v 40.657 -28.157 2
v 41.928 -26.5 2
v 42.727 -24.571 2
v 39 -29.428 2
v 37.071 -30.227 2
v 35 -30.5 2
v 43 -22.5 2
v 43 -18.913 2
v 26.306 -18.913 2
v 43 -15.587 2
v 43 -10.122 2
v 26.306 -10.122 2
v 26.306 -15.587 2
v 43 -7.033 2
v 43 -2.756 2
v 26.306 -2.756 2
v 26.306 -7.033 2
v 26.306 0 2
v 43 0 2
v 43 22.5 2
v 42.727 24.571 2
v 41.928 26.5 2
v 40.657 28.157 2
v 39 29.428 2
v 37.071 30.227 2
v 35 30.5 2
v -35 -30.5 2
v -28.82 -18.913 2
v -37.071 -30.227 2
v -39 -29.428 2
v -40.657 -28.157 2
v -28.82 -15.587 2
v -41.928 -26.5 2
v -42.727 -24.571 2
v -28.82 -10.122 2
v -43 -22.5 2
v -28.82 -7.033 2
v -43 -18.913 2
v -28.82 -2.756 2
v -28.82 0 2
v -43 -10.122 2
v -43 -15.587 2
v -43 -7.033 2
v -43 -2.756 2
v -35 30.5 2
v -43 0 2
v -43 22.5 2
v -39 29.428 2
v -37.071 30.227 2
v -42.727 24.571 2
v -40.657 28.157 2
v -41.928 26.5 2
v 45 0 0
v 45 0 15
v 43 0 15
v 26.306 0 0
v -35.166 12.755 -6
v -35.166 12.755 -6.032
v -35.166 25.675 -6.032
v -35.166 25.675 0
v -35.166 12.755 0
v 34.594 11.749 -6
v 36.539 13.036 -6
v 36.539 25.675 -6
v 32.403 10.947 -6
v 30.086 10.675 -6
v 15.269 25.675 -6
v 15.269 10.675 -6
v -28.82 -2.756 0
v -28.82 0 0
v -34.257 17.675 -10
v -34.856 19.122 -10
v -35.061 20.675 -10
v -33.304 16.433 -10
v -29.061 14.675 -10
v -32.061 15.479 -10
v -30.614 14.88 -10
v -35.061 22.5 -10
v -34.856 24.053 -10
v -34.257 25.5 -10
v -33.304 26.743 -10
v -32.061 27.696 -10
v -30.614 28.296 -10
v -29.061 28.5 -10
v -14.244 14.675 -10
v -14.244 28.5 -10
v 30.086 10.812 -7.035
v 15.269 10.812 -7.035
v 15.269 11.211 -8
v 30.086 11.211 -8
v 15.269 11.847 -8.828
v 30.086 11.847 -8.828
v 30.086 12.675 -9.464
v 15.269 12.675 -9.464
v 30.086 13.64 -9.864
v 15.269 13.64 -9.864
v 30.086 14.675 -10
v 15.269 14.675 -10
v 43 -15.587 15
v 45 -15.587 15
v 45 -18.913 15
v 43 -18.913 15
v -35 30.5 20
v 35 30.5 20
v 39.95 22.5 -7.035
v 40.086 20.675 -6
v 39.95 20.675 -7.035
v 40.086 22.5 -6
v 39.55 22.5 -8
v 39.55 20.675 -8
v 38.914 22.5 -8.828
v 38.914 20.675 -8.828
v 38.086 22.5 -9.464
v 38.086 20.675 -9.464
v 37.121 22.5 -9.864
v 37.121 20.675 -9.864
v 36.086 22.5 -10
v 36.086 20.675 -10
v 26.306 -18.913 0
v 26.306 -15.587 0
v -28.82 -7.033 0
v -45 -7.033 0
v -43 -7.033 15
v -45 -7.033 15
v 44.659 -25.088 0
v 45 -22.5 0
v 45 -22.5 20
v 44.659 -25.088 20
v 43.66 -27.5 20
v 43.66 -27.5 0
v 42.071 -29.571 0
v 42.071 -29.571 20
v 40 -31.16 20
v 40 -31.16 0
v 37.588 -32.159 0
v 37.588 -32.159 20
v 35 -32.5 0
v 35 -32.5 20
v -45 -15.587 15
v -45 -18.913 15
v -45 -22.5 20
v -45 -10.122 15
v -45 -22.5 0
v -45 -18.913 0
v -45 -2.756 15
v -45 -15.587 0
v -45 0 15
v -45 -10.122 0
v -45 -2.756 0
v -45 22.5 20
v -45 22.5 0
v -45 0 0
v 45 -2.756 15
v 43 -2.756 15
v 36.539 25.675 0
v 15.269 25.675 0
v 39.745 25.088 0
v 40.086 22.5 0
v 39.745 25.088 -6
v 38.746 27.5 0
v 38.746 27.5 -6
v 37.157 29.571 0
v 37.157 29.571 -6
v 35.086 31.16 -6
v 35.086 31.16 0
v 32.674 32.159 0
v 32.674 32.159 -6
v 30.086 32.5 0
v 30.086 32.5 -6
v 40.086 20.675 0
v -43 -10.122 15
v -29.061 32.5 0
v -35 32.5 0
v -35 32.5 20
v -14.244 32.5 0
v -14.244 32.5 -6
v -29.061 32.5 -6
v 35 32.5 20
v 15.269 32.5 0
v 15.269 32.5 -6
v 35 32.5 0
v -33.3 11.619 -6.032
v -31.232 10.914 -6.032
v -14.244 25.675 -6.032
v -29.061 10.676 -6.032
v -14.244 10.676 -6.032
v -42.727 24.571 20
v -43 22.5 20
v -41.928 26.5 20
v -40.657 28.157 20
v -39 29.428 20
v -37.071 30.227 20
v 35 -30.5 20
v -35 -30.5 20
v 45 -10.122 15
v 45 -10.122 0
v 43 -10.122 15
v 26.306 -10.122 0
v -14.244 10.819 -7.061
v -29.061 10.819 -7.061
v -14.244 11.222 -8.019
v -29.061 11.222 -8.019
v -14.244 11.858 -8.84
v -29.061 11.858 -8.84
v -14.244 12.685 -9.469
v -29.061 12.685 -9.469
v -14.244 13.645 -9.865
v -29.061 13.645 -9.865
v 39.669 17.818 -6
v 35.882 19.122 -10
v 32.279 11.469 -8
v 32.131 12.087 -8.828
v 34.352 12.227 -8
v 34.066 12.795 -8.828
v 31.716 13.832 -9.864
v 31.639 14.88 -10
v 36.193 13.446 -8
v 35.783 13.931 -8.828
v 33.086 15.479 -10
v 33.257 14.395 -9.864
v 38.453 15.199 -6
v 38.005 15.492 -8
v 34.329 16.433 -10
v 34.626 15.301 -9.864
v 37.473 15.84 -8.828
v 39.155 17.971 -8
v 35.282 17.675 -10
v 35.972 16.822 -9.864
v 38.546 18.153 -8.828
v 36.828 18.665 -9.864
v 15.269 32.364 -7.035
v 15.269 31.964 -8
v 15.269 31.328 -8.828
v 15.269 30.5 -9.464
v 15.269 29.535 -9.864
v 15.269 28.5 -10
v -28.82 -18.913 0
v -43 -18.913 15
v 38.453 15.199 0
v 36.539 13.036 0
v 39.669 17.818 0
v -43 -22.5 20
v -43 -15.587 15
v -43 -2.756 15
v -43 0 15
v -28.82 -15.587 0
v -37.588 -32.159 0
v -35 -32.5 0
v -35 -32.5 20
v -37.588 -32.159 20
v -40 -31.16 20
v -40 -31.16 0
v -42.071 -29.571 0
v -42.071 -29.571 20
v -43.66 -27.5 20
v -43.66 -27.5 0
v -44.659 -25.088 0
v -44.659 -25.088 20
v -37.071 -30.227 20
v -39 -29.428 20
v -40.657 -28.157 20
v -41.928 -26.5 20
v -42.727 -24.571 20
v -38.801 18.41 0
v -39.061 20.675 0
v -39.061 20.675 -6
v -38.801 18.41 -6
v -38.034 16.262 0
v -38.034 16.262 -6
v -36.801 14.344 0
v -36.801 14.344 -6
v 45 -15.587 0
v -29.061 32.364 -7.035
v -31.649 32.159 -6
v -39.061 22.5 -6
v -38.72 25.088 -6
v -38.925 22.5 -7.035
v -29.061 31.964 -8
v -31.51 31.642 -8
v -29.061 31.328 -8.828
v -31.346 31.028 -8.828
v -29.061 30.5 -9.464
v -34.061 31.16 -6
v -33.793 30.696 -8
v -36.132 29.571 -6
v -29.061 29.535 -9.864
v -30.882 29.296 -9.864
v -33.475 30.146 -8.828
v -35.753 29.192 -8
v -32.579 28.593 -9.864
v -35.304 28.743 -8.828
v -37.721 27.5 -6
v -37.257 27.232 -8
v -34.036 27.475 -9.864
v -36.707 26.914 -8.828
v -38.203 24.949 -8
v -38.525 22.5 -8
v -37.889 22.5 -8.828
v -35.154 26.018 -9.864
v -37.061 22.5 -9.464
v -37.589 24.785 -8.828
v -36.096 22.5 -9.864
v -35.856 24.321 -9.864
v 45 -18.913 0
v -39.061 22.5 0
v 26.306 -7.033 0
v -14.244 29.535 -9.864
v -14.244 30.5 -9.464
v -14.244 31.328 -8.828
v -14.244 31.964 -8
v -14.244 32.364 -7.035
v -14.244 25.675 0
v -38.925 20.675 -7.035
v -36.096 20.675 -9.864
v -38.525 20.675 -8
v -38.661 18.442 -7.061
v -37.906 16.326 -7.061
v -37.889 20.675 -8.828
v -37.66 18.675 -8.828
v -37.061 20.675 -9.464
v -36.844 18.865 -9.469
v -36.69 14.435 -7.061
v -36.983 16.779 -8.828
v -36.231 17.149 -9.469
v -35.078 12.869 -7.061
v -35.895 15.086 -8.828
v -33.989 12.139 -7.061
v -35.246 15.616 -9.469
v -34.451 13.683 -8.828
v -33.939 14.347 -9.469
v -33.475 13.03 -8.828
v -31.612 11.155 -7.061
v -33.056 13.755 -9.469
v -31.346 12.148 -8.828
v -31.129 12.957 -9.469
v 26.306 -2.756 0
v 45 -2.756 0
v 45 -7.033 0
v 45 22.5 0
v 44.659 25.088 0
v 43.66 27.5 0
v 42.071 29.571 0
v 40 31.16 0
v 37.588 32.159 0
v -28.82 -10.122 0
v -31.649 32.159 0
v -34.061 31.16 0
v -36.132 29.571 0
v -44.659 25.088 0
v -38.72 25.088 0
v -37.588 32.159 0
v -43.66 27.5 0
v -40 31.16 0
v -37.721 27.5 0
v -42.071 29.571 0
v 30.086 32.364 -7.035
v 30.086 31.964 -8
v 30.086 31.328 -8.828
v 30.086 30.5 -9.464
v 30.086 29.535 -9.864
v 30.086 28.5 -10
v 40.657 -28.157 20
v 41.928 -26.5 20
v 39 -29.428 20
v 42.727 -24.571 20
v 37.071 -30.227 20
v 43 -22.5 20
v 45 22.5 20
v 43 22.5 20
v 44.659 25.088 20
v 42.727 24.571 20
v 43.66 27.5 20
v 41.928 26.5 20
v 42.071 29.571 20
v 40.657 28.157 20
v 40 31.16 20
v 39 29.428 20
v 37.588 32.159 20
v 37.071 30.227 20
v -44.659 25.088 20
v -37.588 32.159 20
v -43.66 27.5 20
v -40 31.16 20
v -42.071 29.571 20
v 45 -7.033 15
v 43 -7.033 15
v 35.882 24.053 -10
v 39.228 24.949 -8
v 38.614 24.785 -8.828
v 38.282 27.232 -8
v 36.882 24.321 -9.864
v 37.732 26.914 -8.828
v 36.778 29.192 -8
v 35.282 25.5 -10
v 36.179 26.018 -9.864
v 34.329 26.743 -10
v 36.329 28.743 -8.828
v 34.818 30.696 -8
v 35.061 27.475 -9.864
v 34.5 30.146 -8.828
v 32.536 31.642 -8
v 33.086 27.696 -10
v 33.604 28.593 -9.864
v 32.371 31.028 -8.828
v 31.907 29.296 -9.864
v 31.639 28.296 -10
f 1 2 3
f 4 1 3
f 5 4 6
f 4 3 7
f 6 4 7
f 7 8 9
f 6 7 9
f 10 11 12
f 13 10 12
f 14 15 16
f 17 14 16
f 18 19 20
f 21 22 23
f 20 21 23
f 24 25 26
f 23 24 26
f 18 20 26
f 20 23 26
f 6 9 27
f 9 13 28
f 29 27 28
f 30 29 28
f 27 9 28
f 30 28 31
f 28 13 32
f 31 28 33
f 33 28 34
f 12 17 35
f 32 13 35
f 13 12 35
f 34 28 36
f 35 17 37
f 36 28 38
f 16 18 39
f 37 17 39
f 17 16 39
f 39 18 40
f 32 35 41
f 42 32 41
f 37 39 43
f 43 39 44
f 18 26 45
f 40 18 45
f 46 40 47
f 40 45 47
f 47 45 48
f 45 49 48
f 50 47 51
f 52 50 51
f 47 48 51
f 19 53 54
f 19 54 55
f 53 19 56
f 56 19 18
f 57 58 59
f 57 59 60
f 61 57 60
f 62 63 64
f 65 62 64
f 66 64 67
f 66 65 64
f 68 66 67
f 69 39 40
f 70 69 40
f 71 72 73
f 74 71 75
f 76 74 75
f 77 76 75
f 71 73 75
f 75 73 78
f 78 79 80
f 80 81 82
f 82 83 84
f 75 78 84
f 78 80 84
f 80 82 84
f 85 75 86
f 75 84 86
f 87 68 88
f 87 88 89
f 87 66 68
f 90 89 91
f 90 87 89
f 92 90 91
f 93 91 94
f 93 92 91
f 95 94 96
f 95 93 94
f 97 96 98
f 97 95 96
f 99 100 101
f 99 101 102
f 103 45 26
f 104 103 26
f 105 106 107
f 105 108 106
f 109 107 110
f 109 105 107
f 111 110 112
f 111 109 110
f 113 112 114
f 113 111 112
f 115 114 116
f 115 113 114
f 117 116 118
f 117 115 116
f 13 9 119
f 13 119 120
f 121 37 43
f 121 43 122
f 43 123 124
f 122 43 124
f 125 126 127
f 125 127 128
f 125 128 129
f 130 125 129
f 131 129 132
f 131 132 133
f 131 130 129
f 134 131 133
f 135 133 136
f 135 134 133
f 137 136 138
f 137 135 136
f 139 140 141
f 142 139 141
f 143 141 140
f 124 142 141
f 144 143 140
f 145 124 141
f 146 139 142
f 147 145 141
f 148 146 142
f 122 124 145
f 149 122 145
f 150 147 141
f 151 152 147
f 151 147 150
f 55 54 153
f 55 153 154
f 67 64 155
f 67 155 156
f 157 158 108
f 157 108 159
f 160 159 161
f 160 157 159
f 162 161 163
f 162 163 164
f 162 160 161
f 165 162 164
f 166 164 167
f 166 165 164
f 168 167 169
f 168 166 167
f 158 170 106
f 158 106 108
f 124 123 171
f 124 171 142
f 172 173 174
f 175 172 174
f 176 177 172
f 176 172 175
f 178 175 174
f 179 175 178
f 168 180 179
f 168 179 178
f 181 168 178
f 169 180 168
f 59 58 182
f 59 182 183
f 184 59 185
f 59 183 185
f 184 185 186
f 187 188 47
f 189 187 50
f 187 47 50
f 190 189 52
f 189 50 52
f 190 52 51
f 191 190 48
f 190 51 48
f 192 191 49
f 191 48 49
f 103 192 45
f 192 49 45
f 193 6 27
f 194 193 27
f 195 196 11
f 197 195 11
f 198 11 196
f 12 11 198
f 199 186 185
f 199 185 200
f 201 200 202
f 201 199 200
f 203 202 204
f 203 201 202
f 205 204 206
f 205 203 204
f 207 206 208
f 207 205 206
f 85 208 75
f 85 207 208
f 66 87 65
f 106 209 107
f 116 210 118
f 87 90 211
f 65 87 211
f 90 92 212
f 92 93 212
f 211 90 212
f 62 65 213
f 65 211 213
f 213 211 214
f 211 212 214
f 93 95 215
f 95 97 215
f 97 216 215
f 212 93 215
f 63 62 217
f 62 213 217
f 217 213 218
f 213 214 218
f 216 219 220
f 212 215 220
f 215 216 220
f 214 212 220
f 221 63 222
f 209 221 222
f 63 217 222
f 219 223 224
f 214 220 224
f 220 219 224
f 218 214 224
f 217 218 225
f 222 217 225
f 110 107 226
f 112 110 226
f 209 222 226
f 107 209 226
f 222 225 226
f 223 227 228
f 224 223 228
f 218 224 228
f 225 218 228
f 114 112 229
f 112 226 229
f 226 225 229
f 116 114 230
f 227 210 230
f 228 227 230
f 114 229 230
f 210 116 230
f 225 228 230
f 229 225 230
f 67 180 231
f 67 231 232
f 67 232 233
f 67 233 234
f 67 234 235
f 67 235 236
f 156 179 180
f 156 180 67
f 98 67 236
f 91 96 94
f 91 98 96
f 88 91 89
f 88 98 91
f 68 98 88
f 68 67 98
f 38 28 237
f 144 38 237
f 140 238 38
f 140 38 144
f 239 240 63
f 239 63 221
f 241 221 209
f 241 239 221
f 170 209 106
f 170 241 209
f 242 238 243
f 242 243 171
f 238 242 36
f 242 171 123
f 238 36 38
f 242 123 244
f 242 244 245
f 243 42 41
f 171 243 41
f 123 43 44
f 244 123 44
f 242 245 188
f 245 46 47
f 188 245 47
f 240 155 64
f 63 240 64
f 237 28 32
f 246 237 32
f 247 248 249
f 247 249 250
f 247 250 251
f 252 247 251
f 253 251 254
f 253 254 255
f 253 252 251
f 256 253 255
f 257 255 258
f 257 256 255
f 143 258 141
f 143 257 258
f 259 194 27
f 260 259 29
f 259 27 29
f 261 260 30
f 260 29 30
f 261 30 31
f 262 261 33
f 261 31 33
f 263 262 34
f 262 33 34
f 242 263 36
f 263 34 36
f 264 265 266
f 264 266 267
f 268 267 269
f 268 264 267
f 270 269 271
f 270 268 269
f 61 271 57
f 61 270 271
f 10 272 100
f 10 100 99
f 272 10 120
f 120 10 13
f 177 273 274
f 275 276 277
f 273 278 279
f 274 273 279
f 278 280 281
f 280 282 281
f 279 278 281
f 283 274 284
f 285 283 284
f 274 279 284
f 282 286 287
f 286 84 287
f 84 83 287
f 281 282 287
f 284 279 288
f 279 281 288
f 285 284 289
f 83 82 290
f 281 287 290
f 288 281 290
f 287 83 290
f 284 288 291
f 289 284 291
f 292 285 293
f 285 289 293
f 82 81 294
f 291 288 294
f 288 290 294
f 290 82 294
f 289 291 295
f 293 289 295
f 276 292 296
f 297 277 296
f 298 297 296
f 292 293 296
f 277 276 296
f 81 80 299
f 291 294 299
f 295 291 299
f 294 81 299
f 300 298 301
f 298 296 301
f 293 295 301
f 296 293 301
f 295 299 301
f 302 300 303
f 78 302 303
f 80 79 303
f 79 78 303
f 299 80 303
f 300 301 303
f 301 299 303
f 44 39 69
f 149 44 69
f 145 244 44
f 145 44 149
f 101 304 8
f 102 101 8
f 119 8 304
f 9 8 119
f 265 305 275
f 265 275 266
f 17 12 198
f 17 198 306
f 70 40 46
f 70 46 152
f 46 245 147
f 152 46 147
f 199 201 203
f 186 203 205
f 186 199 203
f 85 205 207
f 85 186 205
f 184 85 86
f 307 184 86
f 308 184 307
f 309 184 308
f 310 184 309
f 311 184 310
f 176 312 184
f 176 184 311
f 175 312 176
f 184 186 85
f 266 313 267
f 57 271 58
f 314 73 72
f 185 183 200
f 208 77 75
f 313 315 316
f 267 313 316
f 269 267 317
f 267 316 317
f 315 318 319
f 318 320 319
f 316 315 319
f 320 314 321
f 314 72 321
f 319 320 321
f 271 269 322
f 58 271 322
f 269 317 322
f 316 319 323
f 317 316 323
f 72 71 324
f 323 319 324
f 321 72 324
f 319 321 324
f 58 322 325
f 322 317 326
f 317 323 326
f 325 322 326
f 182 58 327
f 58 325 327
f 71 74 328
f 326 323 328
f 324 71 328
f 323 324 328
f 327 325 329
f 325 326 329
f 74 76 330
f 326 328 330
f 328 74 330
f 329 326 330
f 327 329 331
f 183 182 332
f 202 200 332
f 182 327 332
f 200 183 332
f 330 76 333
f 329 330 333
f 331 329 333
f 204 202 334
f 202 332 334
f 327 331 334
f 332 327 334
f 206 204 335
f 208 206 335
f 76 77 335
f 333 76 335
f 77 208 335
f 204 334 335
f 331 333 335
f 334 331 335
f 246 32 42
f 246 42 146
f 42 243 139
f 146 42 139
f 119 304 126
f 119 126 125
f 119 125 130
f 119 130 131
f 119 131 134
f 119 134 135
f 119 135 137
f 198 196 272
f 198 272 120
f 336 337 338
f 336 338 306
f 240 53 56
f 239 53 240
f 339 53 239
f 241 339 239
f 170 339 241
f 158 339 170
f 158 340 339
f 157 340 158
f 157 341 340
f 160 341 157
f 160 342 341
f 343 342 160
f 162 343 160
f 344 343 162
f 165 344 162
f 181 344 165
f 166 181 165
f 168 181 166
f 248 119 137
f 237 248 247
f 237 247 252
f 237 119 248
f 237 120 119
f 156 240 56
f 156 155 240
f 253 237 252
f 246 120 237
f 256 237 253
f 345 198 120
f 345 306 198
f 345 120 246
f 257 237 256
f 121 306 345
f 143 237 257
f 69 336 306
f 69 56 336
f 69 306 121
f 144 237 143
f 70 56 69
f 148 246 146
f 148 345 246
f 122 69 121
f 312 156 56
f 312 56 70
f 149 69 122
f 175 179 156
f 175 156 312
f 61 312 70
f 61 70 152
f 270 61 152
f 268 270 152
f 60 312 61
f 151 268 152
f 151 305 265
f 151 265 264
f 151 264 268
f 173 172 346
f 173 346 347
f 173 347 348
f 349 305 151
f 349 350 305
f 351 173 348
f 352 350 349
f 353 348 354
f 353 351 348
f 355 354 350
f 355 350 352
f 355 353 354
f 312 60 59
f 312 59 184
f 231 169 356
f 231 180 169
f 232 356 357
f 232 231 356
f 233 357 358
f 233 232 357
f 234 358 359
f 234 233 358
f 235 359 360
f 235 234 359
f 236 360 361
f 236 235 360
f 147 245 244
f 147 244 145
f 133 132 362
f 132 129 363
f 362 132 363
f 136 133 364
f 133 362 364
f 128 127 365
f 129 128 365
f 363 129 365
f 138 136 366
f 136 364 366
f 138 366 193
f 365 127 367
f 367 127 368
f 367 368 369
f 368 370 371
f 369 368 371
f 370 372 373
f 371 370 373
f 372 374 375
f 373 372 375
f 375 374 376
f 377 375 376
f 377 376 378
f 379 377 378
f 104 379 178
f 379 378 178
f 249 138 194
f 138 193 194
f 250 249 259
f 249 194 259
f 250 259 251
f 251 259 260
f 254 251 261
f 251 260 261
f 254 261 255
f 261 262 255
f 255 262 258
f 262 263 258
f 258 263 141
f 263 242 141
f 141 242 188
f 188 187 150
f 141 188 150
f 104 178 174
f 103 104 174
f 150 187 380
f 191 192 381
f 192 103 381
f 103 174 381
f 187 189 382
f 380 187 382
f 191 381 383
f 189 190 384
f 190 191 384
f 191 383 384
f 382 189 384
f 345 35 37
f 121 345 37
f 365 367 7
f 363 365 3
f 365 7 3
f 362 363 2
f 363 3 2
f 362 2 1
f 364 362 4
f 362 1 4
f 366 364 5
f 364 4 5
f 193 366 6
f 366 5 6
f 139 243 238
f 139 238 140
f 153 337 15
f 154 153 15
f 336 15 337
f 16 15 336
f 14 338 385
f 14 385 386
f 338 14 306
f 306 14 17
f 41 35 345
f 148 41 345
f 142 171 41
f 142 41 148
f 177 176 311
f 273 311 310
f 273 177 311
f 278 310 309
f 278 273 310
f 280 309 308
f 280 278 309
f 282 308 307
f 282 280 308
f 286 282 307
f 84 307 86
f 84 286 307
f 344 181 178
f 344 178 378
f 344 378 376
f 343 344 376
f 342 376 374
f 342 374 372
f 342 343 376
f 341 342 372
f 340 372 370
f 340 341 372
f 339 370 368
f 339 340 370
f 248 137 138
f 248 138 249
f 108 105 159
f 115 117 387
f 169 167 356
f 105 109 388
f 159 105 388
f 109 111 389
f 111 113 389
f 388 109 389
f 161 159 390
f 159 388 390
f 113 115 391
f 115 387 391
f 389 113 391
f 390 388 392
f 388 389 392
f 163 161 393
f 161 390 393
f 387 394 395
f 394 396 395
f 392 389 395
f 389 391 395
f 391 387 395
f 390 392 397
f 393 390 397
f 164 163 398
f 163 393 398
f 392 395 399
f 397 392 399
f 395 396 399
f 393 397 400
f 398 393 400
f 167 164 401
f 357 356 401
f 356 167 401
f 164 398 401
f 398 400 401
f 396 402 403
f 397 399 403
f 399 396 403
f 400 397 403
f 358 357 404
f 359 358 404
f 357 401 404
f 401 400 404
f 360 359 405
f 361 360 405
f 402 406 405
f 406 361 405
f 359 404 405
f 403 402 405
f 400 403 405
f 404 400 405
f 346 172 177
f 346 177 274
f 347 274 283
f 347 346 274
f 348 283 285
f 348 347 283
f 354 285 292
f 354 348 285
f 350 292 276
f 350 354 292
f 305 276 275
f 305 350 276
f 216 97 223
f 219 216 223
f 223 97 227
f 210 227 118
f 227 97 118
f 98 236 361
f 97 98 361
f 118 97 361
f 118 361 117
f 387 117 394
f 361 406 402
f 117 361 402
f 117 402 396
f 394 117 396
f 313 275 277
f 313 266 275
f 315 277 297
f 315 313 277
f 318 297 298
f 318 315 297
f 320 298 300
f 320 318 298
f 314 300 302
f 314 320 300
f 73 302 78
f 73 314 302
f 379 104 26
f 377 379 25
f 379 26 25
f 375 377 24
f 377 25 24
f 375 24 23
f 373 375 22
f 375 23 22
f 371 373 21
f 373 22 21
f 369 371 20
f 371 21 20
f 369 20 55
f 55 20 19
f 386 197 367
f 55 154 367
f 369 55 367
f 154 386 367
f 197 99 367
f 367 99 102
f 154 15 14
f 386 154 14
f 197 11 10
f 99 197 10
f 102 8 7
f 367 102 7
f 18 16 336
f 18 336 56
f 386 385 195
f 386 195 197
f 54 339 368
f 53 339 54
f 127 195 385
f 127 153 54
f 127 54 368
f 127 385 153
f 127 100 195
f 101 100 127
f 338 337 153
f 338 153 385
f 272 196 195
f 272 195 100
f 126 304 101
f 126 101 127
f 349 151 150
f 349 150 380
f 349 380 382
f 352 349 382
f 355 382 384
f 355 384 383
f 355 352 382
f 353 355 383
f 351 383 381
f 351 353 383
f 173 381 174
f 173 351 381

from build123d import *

# Parameters (mm, degrees)
RESSALTO_EXTRUS_O1_DEPTH   = 20
CASCA1_T                   = -2
RESSALTO_EXTRUS_O2_DEPTH   = 10
FILETE1_R                  = 4
ESBO_O5_W                  = 23.985697769
ESBO_O5_H                  = 6
CORTE_EXTRUS_O1_DEPTH      = 15
ESBO_O6_W                  = 24.497787774
ESBO_O6_H                  = 6.032330751
CORTE_EXTRUS_O2_DEPTH      = 15
CORTE_EXTRUS_O3_DEPTH      = 15
CORTE_EXTRUS_O3_DEPTH_BACK = 15
ESBO_O7_W                  = 38.492647719
ESBO_O7_H                  = 2.75587166
ESBO_O7_H_2                = 3.088916175
ESBO_O7_H_3                = 3.326525112
ESBO_O7_W_2                = 34.690904734


with BuildPart() as part:
    # Esboço1 → Ressalto-extrusão1 (new body)
    with BuildSketch(Plane.XY):
        with BuildLine():
            Line((-35, 32.5), (35, 32.5))
            ThreePointArc((35, 32.5), (42.071067812, 29.571067812), (45, 22.5))
            Line((45, 22.5), (45, -22.5))
            ThreePointArc((45, -22.5), (42.071067812, -29.571067812), (35, -32.5))
            Line((35, -32.5), (-35, -32.5))
            ThreePointArc((-35, -32.5), (-42.071067812, -29.571067812), (-45, -22.5))
            Line((-45, -22.5), (-45, 22.5))
            ThreePointArc((-45, 22.5), (-42.071067812, 29.571067812), (-35, 32.5))
        make_face()
    extrude(amount=RESSALTO_EXTRUS_O1_DEPTH)

    # Casca1
    casca1_openings = [part.faces().sort_by_distance(p)[0] for p in [
        (0, 0, 20),
    ]]
    offset(amount=CASCA1_T, openings=casca1_openings, kind=Kind.INTERSECTION)

    # Esboço2 → Ressalto-extrusão2 (add)
    with BuildSketch(Plane(origin=(0, 0, 0), x_dir=(-1, 0, 0), z_dir=(0, 0, -1))):
        with BuildLine():
            Line((-30.08601431, 32.5), (-15.268763233, 32.5))
            Line((-15.268763233, 32.5), (-15.268763233, 10.675395158))
            Line((-15.268763233, 10.675395158), (-30.08601431, 10.675395158))
            ThreePointArc((-30.08601431, 10.675395158), (-37.157082122, 13.604327346), (-40.08601431, 20.675395158))
            Line((-40.08601431, 20.675395158), (-40.08601431, 22.5))
            ThreePointArc((-40.08601431, 22.5), (-37.157082122, 29.571067812), (-30.08601431, 32.5))
        make_face()
        with BuildLine():
            Line((14.243643453, 32.5), (29.06089453, 32.5))
            ThreePointArc((29.06089453, 32.5), (36.131962342, 29.571067812), (39.06089453, 22.5))
            Line((39.06089453, 22.5), (39.06089453, 20.675395158))
            ThreePointArc((39.06089453, 20.675395158), (36.131962342, 13.604327346), (29.06089453, 10.675395158))
            Line((29.06089453, 10.675395158), (14.243643453, 10.675395158))
            Line((14.243643453, 10.675395158), (14.243643453, 32.5))
        make_face()
    extrude(amount=RESSALTO_EXTRUS_O2_DEPTH)

    # Filete1
    filete1_edges = [part.edges().sort_by_distance(p)[0] for p in [
        (-21.652268991, 10.675395158, -10),
        (-36.131962342, 13.604327346, -10),
        (-39.06089453, 21.587697579, -10),
        (-36.131962342, 29.571067812, -10),
        (22.677388772, 10.675395158, -10),
        (37.157082122, 13.604327346, -10),
        (40.08601431, 21.587697579, -10),
        (37.157082122, 29.571067812, -10),
        (-21.652268991, 32.5, -10),
        (22.677388772, 32.5, -10),
    ]]
    fillet(filete1_edges, radius=FILETE1_R)

    # Esboço5 → Corte-extrusão1 (cut)
    with BuildSketch(Plane(origin=(0, 10.675395158, 0), x_dir=(-1, 0, 0), z_dir=(0, -1, 0))):
        with Locations((-24.546243996, 3)):
            Rectangle(ESBO_O5_W, ESBO_O5_H)
    extrude(amount=-CORTE_EXTRUS_O1_DEPTH, mode=Mode.SUBTRACT)

    # Esboço6 → Corte-extrusão2 (cut)
    with BuildSketch(Plane.XZ.offset(-10.675395158)):
        with Locations((-22.916938832, -3.016165375)):
            Rectangle(ESBO_O6_W, ESBO_O6_H)
    extrude(amount=-CORTE_EXTRUS_O2_DEPTH, mode=Mode.SUBTRACT)

    # Esboço7 → Corte-extrusão3 (cut, two sides: drawn at the far end of the back side and taken through both)
    with BuildSketch(Plane(origin=(0, 0, 0), x_dir=(-1, 0, 0), z_dir=(0, 0, -1)).offset(-CORTE_EXTRUS_O3_DEPTH_BACK)):
        with Locations((-45.552020228, -1.37793583)):
            Rectangle(ESBO_O7_W, ESBO_O7_H)
        with Locations((-45.552020228, -8.577290605)):
            Rectangle(ESBO_O7_W, ESBO_O7_H_2)
        with Locations((-45.552020228, -17.250016789)):
            Rectangle(ESBO_O7_W, ESBO_O7_H_3)
        with Locations((46.165029276, -1.37793583)):
            Rectangle(ESBO_O7_W_2, ESBO_O7_H)
        with Locations((46.165029276, -8.577290605)):
            Rectangle(ESBO_O7_W_2, ESBO_O7_H_2)
        with Locations((46.165029276, -17.250016789)):
            Rectangle(ESBO_O7_W_2, ESBO_O7_H_3)
    extrude(amount=CORTE_EXTRUS_O3_DEPTH + CORTE_EXTRUS_O3_DEPTH_BACK, mode=Mode.SUBTRACT)


solid = part.part
